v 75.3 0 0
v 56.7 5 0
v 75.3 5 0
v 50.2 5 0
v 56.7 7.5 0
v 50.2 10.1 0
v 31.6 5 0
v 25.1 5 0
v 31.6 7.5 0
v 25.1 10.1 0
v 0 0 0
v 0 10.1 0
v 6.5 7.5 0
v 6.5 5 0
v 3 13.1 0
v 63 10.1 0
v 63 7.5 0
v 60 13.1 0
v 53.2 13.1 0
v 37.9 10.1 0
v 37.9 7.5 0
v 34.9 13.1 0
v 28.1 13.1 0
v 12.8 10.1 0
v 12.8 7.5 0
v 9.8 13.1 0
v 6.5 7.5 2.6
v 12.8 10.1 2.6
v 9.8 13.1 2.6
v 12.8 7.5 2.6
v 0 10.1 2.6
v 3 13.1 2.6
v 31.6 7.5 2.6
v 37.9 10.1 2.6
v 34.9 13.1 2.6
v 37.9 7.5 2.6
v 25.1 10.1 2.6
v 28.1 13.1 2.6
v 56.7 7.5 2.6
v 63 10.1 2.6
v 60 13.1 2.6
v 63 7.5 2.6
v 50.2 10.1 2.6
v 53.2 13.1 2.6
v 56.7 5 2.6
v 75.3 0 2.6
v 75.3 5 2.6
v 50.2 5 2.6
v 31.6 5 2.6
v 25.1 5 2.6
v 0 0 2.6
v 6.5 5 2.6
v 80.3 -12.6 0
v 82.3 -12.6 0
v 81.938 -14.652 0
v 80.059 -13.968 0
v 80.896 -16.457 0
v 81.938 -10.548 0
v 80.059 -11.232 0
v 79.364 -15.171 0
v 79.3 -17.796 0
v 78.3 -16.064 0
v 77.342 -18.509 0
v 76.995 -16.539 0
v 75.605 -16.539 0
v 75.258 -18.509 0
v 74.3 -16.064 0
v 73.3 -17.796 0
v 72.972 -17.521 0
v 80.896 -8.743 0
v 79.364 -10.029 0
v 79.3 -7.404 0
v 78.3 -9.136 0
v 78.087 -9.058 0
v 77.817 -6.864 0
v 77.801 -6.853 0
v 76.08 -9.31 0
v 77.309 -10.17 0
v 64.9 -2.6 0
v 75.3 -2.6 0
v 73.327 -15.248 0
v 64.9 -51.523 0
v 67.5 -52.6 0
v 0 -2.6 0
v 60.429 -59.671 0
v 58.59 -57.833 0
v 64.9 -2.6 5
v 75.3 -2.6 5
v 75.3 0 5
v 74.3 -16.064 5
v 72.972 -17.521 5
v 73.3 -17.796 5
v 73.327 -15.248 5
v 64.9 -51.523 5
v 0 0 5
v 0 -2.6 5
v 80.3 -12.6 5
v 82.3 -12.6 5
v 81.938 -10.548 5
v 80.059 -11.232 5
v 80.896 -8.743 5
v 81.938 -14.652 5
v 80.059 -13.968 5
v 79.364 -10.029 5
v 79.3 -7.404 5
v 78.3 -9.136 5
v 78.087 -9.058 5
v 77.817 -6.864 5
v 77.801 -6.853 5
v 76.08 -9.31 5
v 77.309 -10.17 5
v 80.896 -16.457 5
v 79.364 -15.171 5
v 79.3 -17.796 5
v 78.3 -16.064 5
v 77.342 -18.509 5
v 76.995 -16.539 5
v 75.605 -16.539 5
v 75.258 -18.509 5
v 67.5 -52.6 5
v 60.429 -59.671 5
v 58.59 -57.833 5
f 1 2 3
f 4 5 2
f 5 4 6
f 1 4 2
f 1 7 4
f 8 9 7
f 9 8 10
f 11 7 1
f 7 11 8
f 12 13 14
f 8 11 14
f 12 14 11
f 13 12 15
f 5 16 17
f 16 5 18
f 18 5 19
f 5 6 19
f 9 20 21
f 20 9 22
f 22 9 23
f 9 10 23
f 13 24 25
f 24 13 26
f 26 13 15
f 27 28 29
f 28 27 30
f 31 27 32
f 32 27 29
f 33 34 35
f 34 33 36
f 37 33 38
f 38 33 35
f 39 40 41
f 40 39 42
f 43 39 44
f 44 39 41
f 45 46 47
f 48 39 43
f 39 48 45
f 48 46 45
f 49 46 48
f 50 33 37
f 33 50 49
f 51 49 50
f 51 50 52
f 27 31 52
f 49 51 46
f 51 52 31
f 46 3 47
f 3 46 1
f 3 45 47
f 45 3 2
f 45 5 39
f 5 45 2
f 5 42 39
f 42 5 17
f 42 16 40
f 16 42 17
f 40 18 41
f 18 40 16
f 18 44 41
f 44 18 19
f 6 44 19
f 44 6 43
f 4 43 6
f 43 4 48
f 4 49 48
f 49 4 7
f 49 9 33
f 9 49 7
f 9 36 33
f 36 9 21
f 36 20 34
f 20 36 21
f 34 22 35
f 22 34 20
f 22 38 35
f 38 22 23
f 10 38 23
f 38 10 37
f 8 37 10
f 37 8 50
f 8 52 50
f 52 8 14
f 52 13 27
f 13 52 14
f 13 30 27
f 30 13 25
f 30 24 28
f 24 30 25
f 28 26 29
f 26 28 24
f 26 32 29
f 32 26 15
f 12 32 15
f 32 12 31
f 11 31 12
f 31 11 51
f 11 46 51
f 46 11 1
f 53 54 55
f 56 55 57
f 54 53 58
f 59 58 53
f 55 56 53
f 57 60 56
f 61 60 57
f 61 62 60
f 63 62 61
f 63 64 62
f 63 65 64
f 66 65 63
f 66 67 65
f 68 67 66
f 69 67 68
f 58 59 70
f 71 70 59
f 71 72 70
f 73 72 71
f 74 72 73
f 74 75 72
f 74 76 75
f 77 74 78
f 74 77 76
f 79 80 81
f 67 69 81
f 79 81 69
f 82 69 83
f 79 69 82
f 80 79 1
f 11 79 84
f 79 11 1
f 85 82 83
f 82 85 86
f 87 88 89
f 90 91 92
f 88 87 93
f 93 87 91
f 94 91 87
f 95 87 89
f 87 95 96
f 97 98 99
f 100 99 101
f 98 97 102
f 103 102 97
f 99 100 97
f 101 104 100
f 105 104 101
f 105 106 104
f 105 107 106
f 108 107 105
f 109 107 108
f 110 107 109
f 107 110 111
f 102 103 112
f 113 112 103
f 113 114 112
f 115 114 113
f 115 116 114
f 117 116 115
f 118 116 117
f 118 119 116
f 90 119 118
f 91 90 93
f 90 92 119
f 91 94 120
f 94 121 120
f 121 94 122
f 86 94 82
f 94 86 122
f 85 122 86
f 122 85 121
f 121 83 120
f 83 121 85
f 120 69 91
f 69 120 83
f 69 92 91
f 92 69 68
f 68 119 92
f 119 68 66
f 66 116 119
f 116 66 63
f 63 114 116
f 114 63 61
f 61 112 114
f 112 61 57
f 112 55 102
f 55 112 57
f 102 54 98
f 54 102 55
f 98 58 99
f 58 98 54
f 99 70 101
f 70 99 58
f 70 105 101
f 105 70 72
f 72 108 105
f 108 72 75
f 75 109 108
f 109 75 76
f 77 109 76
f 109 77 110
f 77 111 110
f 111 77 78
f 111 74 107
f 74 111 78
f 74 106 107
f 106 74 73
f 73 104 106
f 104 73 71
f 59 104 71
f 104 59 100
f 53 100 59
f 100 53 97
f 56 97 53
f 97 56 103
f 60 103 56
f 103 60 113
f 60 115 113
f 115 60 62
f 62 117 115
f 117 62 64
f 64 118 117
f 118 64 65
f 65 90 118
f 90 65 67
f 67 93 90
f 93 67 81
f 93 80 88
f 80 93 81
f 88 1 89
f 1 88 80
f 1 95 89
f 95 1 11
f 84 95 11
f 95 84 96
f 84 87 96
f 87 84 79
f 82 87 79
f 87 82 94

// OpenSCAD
//////////////////////////////////////////////////////
// Holder Measurements
//

hook_width = 12.8;
hook_to_hook = 37.9 - hook_width;  // 38.2
hook_gap = 2.5;
hook_length = 5.6 + hook_gap;
hook_notch = 5.6 - 2.6;
hook_arm = 6.5;

hook_thick = 2.6;


//////////////////////////////////////////////////////
// Render!
//

// THE BASE CUBICLE HOOK
linear_extrude(height = hook_thick) three_hooks();


// EXTRA STUFF ATTACHED TO THE HOOK
translate([0,-hook_thick,0])
linear_extrude(height = 5) union()
{
    square([hook_to_hook*3, hook_thick]);

    translate([hook_to_hook*3 - hook_thick*4, 0])
        polygon(points = [ [0, 0],
                           [0, -50],
                           [hook_thick, -50],
                           [hook_thick*4, 0] ],
                path = [ [0:3] ]);

    translate([hook_to_hook*3 - hook_thick*3, -50])
        rotate(135) square([hook_thick, 10]);

    // add cable hook
    translate([hook_to_hook*3+1, -10]) difference()
    {
        circle(6, $fn=18);
        circle(4, $fn=18);
        translate([-2.1,0]) square([3.6,7]);

    }
    translate([hook_to_hook*3+1 - 0.22,-10 + 3.29]) rotate(-35) square([1.5,3]);
}



//////////////////////////////////////////////////////
// The Modules
//

module three_hooks()
{
    base = 5;

    for(i=[0:2])
        translate([hook_to_hook*i, base]) hook();
    square([hook_to_hook*3, base]);
}




module hook()
{
    polygon(points = [ [0, 0],
                       [0, hook_length - hook_notch],
                       [hook_notch, hook_length],
                       [hook_width - hook_notch, hook_length],
                       [hook_width, hook_length - hook_notch],
                       [hook_width, hook_gap],
                       [hook_arm, hook_gap],
                       [hook_arm, 0],
                     ],
             path = [ [0:7] ]);
}
